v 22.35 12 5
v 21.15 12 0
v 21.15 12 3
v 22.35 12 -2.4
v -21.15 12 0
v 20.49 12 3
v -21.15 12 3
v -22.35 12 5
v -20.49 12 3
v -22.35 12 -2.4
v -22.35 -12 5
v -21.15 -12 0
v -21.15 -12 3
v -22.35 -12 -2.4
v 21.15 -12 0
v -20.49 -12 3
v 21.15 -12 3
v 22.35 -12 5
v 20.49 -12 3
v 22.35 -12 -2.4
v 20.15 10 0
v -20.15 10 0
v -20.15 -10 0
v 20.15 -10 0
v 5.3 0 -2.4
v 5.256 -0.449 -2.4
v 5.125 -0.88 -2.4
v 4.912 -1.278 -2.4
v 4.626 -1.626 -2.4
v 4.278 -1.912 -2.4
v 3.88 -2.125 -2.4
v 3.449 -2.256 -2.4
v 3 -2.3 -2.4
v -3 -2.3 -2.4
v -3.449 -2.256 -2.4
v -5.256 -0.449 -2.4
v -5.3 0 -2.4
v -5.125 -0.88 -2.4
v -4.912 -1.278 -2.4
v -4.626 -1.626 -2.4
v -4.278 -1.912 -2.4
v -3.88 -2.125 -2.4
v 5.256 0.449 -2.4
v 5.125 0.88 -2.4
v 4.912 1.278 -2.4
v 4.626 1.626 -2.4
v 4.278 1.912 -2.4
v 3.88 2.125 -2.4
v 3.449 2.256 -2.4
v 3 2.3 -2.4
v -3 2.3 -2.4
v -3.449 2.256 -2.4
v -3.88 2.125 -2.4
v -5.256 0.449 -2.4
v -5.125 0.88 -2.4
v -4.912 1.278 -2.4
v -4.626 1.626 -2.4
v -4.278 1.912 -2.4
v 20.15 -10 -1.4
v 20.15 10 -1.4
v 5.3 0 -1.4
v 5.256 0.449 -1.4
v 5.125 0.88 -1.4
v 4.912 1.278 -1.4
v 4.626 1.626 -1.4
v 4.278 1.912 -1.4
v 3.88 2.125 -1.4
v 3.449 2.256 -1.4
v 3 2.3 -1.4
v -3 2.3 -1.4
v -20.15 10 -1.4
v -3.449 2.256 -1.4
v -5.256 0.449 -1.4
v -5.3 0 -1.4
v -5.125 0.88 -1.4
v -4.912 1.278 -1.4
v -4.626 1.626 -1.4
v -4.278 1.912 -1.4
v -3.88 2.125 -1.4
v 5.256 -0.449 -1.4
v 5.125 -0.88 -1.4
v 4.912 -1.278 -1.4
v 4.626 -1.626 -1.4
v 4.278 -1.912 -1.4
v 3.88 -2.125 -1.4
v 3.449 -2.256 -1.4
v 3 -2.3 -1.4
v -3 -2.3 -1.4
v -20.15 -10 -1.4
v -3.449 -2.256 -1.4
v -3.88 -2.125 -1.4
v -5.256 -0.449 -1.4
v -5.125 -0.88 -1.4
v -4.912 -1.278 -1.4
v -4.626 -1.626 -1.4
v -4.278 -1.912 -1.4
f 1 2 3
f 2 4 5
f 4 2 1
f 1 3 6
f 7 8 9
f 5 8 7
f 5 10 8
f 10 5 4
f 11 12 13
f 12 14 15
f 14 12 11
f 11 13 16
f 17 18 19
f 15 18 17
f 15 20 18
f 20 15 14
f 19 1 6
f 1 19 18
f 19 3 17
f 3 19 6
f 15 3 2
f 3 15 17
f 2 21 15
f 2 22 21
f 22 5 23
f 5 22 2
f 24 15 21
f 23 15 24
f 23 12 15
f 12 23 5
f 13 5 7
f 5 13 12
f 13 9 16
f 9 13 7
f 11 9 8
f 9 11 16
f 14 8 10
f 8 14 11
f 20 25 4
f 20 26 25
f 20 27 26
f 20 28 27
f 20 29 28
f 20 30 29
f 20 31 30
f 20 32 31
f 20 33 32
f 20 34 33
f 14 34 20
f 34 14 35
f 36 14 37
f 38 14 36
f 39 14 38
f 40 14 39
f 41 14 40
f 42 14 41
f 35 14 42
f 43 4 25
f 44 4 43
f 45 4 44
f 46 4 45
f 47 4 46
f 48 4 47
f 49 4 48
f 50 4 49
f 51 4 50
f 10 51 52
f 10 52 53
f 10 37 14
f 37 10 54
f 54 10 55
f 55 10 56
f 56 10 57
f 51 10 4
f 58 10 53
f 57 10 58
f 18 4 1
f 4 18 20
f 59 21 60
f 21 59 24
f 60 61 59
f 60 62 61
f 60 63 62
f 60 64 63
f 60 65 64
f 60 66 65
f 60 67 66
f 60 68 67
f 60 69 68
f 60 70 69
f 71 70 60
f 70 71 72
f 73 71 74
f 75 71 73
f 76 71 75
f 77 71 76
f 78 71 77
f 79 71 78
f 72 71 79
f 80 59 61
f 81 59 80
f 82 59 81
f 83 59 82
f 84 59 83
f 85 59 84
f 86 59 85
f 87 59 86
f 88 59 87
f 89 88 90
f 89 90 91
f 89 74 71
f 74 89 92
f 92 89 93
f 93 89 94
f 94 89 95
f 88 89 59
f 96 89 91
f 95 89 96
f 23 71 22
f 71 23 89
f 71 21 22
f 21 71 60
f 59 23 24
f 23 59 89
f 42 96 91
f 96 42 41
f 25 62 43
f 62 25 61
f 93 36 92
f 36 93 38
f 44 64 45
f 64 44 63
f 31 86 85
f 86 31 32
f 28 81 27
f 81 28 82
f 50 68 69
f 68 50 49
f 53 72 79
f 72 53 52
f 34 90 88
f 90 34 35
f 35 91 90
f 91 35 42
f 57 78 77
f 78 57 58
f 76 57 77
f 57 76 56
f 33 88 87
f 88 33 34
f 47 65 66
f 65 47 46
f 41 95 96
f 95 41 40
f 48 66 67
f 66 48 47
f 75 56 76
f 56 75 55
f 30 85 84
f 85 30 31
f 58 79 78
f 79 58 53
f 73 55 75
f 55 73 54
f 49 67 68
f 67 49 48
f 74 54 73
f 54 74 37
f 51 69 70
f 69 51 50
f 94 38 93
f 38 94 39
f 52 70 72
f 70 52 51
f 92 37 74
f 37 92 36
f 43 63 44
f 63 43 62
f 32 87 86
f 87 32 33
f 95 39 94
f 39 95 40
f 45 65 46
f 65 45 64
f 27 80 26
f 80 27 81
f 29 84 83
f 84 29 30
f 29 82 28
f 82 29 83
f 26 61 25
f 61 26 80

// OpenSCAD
$fn=32;
width = 24;
channel_width = 42.3;
latch_height = 2;
overhang = 0.66;
wall_thickness = 3;
box_thickness = 2.4;
bottom_thickness = 1;
screw_hole_radius = 2.3;
screw_hole_width = 6;

outer_x = channel_width/2 + 1.2;

difference() {
  rotate([90,0,0])
  translate([0, 0, -width/2])
  linear_extrude(width)
  polygon([
    [-outer_x, -box_thickness],
    [-outer_x, wall_thickness + latch_height],
    [-channel_width/2 + overhang, wall_thickness],
    [-channel_width/2, wall_thickness],
    [-channel_width/2, 0],
    [channel_width/2, 0],
    [channel_width/2, wall_thickness],
    [channel_width/2 - overhang, wall_thickness],
    [outer_x, wall_thickness + latch_height],
    [outer_x, -box_thickness],
  ]);
    
  translate([0, 0, -box_thickness/2 + bottom_thickness])
  cube([channel_width - 2, width - 4, box_thickness], center=true);


  translate([0, 0, -box_thickness - 1])
  hull() {
    translate([screw_hole_width/2, 0, 0])
    cylinder(h=bottom_thickness+2, r=screw_hole_radius);
    translate([-screw_hole_width/2, 0, 0])
    cylinder(h=bottom_thickness+2, r=screw_hole_radius);
  }
}
